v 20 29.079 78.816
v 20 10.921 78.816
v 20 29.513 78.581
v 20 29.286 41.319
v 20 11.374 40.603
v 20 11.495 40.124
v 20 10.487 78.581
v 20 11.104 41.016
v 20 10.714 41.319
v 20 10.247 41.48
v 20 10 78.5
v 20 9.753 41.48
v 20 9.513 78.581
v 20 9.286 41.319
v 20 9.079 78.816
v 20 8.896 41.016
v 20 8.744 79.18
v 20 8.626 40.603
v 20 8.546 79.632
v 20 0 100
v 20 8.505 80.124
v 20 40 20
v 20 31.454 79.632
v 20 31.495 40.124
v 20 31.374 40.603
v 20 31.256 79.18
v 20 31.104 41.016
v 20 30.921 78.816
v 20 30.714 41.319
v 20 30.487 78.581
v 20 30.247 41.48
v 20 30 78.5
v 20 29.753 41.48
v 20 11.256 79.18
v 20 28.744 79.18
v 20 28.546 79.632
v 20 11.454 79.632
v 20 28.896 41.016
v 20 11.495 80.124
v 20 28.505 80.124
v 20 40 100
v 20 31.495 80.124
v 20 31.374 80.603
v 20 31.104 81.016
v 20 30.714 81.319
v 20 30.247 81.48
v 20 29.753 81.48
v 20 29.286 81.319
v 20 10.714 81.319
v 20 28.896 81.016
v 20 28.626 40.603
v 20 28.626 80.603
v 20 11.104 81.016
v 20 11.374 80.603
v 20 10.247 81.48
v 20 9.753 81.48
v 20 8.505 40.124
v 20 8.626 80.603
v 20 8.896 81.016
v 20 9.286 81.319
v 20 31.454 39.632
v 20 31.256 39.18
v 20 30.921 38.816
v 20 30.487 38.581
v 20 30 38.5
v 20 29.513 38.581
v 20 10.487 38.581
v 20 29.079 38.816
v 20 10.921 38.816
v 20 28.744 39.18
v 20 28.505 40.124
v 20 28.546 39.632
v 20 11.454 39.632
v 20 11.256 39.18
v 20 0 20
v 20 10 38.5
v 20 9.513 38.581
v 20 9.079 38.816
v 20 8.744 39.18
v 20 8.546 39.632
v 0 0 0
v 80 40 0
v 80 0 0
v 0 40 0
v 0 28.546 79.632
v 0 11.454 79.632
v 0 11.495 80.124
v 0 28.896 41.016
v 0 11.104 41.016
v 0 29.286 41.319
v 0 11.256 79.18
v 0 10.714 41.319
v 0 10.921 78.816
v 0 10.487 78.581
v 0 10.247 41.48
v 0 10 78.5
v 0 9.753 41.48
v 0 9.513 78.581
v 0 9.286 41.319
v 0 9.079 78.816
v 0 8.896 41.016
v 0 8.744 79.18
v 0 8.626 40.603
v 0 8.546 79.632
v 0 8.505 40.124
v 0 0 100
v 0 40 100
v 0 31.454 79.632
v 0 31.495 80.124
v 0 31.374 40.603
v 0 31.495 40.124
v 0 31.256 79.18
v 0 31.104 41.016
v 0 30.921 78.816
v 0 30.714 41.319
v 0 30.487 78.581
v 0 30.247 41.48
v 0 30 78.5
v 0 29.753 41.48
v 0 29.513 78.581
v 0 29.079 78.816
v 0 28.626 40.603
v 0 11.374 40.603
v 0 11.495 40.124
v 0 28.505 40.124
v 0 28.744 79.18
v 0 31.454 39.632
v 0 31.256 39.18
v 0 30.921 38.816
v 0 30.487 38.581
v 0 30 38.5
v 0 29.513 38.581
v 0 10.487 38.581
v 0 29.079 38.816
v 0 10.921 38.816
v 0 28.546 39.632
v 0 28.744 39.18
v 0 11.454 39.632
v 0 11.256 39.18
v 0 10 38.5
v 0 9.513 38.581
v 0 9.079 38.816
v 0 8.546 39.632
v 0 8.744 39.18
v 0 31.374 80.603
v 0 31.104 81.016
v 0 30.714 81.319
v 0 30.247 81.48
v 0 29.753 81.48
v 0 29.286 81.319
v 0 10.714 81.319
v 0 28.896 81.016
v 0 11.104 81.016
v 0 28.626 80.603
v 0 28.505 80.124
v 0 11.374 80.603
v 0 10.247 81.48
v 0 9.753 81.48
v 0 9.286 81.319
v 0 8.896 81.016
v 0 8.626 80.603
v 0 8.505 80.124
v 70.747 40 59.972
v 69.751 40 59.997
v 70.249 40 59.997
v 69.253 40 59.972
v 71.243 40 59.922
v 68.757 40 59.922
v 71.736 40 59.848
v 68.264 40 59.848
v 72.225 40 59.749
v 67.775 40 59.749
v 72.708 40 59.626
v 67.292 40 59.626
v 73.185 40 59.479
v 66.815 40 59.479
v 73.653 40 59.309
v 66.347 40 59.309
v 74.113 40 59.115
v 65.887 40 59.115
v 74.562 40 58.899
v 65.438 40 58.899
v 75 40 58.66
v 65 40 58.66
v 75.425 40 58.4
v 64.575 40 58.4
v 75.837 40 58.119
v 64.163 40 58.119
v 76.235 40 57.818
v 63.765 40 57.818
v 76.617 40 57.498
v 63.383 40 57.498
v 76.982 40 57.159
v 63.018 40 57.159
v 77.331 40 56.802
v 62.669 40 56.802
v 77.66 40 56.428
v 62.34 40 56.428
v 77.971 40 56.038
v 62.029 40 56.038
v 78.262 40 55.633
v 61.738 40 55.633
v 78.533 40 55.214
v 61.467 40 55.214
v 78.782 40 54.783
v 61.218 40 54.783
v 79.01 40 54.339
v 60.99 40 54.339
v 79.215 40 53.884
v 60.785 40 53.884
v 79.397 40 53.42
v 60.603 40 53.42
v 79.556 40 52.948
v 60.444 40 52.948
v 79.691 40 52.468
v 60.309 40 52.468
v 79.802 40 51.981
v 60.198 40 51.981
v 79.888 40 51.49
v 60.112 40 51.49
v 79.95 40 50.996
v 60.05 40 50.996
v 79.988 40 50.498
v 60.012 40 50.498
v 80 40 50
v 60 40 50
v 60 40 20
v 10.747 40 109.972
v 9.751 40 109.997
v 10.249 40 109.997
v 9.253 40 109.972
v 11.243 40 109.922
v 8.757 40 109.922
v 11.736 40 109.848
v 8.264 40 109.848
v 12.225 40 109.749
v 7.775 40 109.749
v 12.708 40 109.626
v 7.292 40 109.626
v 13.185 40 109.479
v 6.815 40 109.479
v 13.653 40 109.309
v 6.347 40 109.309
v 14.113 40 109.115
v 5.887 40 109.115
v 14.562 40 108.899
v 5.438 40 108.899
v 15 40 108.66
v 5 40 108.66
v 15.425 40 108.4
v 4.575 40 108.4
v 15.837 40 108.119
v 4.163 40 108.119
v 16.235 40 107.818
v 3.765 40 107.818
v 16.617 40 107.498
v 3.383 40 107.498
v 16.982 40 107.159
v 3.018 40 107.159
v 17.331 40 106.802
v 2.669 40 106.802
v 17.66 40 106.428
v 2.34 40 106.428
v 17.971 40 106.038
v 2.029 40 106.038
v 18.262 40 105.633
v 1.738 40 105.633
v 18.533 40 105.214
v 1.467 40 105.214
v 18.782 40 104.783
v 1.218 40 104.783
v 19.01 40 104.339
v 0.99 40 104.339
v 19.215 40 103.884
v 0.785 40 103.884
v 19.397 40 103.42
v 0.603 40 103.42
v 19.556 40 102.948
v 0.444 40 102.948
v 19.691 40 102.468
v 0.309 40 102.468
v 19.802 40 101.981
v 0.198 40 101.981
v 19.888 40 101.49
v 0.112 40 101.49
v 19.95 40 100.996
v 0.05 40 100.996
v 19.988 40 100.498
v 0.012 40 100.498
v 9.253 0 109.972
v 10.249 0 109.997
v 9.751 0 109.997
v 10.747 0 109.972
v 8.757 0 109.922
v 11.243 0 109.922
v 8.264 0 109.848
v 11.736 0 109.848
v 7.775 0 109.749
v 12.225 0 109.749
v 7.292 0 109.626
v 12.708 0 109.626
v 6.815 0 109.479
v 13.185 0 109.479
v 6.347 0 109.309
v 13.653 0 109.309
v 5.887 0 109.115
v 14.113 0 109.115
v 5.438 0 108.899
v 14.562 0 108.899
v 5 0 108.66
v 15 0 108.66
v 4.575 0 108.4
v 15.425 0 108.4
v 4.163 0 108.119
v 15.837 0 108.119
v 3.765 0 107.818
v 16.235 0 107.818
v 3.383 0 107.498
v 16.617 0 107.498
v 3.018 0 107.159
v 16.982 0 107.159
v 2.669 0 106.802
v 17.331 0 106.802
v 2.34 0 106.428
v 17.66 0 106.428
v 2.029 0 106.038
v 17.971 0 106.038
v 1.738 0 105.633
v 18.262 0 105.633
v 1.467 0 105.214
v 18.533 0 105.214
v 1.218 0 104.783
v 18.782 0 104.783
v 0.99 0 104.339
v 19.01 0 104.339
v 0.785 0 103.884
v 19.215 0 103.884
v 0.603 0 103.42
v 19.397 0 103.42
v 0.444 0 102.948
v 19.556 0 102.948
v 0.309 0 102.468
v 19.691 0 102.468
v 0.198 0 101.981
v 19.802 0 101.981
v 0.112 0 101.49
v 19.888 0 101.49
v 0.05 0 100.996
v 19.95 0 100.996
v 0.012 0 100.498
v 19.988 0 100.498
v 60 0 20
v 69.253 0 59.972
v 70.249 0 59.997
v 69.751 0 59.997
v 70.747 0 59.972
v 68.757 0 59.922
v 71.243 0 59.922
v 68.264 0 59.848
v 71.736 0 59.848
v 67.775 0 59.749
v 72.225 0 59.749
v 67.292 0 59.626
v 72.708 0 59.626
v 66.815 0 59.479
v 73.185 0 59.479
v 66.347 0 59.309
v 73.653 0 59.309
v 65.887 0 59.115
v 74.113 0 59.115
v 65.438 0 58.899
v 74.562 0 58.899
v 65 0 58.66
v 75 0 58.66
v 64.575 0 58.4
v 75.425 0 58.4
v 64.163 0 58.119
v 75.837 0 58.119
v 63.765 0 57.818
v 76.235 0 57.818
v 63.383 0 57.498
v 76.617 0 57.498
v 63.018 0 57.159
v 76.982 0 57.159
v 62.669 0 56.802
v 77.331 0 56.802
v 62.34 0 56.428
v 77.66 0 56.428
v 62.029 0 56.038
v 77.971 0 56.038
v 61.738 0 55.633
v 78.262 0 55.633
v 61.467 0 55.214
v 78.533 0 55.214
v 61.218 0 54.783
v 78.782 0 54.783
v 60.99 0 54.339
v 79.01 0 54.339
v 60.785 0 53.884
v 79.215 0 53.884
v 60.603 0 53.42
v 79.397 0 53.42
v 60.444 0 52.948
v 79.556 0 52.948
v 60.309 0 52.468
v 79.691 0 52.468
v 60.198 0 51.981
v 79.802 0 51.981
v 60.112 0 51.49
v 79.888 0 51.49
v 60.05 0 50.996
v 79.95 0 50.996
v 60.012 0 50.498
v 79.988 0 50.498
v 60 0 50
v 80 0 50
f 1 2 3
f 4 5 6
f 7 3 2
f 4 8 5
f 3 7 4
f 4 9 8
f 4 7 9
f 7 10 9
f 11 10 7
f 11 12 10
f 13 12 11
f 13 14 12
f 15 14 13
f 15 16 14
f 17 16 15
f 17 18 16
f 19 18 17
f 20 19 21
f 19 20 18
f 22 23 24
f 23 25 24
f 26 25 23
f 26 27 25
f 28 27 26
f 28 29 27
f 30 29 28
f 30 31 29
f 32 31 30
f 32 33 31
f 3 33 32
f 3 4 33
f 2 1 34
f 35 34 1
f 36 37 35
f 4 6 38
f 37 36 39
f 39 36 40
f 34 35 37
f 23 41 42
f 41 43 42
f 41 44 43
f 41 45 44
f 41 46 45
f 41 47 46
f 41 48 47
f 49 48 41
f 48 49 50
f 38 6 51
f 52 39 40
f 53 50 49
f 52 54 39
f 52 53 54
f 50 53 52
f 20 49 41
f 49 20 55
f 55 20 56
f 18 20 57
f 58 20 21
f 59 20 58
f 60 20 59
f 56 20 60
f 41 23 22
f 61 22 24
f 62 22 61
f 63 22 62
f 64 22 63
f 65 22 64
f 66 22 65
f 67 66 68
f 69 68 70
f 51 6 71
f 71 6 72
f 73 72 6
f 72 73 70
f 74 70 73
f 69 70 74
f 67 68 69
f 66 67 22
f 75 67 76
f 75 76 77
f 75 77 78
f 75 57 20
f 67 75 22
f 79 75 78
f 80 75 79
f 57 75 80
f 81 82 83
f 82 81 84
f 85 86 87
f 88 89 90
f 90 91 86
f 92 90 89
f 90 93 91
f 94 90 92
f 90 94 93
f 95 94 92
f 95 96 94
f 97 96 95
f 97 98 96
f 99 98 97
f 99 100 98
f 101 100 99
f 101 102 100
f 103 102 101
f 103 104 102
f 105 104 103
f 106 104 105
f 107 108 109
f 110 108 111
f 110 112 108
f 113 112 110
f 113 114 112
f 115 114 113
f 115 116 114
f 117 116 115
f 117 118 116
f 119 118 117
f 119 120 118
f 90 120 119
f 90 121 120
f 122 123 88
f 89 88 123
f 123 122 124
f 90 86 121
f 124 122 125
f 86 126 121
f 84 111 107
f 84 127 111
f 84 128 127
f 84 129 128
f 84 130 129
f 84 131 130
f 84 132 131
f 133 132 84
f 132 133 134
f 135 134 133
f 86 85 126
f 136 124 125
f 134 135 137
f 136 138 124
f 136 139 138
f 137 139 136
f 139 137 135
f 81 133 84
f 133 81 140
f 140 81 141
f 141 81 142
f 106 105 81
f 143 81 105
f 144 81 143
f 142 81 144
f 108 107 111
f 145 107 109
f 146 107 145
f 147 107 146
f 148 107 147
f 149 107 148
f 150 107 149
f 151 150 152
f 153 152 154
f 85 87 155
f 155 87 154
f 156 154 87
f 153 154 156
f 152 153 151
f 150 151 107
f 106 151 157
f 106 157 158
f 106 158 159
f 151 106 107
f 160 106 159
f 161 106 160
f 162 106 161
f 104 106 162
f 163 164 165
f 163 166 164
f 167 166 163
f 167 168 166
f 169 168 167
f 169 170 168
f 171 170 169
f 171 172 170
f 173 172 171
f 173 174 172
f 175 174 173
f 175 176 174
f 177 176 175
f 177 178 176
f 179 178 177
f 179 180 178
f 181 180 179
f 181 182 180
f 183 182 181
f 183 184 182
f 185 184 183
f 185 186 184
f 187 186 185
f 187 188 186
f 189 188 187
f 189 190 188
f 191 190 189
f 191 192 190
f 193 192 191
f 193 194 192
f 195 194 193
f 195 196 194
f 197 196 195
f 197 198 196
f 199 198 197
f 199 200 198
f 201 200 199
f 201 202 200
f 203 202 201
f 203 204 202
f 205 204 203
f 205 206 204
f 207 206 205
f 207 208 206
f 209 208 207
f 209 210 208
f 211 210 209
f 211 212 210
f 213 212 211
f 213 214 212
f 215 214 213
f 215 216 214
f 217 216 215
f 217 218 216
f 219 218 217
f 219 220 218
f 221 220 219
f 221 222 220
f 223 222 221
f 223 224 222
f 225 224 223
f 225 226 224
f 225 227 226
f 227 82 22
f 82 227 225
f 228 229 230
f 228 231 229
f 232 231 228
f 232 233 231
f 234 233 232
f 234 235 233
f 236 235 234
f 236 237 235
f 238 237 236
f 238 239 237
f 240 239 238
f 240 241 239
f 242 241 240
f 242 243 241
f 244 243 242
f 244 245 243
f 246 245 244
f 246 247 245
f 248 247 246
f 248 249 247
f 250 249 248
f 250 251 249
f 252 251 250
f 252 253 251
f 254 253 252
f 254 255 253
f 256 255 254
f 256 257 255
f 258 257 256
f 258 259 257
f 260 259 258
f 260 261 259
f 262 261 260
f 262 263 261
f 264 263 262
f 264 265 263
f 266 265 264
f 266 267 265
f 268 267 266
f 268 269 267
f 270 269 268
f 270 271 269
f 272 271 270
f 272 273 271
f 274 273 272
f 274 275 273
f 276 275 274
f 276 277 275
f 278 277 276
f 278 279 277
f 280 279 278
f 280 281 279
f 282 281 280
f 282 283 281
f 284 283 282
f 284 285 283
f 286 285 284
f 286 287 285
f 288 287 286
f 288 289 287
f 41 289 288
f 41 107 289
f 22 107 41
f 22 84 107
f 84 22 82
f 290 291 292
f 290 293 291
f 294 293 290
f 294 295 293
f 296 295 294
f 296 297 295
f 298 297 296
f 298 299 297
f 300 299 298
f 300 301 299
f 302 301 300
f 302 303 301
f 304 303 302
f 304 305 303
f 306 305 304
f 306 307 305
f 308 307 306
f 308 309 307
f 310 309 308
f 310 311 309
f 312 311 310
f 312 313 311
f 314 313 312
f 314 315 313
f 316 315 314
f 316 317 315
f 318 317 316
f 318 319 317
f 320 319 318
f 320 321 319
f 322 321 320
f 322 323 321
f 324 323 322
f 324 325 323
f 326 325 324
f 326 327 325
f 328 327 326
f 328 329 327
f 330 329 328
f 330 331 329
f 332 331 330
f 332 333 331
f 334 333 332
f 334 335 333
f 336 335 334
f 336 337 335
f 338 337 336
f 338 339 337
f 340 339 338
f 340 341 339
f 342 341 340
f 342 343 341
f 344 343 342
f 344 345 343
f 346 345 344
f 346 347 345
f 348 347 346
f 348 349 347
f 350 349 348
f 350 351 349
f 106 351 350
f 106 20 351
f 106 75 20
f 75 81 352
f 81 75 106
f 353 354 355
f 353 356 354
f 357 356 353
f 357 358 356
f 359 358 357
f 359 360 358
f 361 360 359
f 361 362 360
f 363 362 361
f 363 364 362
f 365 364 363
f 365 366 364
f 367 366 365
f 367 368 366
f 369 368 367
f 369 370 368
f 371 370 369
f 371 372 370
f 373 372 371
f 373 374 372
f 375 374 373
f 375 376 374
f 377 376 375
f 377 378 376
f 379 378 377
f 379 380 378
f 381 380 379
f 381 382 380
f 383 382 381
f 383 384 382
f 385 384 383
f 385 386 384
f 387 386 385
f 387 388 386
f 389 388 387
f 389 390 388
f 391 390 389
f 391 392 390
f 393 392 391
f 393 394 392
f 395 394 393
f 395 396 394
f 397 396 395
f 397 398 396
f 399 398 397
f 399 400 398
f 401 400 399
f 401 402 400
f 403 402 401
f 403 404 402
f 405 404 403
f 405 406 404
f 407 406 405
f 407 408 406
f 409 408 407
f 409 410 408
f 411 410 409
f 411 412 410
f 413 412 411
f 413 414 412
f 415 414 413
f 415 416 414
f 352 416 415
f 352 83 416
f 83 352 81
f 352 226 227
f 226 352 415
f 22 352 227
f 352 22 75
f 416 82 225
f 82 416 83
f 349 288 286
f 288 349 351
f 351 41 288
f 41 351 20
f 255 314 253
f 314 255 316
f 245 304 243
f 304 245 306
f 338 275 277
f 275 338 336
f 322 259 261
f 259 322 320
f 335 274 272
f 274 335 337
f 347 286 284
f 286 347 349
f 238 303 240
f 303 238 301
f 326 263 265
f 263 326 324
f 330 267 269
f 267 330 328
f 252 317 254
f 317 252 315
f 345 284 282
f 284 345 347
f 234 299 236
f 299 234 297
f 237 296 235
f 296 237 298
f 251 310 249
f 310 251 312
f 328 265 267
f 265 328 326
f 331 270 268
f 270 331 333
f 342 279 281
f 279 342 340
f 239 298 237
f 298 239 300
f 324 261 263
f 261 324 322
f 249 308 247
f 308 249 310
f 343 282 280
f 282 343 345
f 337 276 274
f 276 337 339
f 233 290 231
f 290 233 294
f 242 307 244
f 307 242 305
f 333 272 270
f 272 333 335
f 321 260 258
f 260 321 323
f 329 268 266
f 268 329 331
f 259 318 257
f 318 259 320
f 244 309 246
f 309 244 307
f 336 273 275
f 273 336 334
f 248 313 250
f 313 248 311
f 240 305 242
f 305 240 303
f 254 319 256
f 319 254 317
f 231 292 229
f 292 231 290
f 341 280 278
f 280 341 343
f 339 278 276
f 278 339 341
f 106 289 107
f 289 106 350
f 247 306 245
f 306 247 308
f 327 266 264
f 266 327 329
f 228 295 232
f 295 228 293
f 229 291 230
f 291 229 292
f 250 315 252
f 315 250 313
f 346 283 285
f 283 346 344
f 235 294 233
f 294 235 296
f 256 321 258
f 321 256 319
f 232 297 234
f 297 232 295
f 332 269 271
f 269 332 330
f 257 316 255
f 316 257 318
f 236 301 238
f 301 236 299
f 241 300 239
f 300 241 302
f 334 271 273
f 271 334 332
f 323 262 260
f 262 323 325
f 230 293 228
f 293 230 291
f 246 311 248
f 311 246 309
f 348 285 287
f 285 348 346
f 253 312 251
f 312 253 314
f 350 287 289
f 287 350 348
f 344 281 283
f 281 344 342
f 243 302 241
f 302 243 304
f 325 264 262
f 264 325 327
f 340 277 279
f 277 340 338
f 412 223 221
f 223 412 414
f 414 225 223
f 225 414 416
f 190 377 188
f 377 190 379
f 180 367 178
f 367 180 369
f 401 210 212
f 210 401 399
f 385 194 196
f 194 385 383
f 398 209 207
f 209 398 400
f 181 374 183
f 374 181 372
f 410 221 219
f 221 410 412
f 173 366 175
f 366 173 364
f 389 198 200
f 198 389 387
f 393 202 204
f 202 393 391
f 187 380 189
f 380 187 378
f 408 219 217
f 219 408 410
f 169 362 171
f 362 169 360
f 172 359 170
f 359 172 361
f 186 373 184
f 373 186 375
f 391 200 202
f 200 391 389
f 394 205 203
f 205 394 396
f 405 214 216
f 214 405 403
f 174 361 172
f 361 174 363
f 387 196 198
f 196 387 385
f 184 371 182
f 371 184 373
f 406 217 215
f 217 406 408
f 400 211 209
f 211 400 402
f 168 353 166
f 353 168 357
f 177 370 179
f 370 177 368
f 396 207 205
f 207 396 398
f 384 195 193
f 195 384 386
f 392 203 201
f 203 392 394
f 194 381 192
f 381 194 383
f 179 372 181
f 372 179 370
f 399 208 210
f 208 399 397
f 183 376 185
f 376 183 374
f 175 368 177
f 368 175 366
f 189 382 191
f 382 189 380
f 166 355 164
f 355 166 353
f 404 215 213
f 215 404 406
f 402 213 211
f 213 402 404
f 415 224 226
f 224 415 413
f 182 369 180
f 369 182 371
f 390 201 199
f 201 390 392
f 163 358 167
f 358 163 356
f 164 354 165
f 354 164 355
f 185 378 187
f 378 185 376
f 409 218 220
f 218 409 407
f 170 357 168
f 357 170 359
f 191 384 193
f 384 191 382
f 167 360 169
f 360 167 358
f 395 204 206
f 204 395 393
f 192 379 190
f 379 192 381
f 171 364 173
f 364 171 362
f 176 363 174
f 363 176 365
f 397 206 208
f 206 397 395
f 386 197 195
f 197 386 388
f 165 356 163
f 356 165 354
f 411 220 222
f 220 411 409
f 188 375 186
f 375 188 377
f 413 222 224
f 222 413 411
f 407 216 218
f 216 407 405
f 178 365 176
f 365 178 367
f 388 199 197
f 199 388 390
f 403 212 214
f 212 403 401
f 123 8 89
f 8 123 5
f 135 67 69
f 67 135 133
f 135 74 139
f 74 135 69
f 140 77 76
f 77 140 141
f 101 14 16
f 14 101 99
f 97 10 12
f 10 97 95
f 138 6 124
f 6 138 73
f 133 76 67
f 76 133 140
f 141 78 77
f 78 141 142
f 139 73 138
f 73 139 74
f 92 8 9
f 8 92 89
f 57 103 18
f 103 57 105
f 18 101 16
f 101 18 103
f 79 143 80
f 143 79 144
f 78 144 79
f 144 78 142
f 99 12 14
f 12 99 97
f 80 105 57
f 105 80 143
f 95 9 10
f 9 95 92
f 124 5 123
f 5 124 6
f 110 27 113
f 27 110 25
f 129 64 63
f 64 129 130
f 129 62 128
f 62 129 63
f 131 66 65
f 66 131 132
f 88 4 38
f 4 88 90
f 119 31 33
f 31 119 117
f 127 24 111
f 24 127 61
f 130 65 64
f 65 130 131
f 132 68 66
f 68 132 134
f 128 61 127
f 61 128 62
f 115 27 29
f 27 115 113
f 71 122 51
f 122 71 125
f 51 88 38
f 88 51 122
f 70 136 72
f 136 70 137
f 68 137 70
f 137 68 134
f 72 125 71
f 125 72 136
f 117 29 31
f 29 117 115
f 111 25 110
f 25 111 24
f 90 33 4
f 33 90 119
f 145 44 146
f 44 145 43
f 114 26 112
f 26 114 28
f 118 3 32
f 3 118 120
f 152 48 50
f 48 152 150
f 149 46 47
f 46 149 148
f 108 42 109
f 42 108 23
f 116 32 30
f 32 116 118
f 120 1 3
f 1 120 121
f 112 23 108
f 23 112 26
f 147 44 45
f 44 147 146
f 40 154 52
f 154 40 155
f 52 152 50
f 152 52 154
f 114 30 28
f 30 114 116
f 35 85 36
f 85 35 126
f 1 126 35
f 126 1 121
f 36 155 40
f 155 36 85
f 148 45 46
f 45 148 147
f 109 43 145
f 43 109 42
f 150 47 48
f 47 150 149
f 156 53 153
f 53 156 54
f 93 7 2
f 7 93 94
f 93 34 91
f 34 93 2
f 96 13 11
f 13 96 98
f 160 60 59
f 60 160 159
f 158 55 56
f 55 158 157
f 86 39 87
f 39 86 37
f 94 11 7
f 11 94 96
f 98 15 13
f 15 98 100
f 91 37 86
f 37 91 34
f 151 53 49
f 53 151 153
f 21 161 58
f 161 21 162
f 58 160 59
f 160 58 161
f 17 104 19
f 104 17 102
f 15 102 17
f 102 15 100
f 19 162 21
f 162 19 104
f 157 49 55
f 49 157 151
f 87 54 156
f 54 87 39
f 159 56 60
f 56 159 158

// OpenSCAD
$fs=.5;
$fa=.5;
width = 40;
hole_size = 3;
back_height=100;
front_height=50;
thickness=20;
bottom_hole_height=40;
top_hole_height=80;
front_length=60;
difference()
{
	union()
	{
	cube([thickness,width,back_height]);
	cube([front_length,width,thickness]);
	translate([front_length,0,0])cube([thickness,width,front_height]);
	rotate([90,0,0])translate([thickness/2,back_height,-width/2])cylinder(h=width, r=thickness/2, center=true);
	rotate([90,0,0])translate([front_length+thickness/2,front_height,-width/2])cylinder(h=width, r=thickness/2,center=true);
}
rotate([0,90,0])translate([-bottom_hole_height,10,-1])cylinder(d=hole_size, h=thickness+2);
rotate([0,90,0])translate([-bottom_hole_height,width-10,-1])cylinder(d=hole_size, h=thickness+2);
rotate([0,90,0])translate([-top_hole_height,width-10,-1])cylinder(d=hole_size, h=thickness+2);
rotate([0,90,0])translate([-top_hole_height,10,-1])cylinder(d=hole_size, h=thickness+2);
}
